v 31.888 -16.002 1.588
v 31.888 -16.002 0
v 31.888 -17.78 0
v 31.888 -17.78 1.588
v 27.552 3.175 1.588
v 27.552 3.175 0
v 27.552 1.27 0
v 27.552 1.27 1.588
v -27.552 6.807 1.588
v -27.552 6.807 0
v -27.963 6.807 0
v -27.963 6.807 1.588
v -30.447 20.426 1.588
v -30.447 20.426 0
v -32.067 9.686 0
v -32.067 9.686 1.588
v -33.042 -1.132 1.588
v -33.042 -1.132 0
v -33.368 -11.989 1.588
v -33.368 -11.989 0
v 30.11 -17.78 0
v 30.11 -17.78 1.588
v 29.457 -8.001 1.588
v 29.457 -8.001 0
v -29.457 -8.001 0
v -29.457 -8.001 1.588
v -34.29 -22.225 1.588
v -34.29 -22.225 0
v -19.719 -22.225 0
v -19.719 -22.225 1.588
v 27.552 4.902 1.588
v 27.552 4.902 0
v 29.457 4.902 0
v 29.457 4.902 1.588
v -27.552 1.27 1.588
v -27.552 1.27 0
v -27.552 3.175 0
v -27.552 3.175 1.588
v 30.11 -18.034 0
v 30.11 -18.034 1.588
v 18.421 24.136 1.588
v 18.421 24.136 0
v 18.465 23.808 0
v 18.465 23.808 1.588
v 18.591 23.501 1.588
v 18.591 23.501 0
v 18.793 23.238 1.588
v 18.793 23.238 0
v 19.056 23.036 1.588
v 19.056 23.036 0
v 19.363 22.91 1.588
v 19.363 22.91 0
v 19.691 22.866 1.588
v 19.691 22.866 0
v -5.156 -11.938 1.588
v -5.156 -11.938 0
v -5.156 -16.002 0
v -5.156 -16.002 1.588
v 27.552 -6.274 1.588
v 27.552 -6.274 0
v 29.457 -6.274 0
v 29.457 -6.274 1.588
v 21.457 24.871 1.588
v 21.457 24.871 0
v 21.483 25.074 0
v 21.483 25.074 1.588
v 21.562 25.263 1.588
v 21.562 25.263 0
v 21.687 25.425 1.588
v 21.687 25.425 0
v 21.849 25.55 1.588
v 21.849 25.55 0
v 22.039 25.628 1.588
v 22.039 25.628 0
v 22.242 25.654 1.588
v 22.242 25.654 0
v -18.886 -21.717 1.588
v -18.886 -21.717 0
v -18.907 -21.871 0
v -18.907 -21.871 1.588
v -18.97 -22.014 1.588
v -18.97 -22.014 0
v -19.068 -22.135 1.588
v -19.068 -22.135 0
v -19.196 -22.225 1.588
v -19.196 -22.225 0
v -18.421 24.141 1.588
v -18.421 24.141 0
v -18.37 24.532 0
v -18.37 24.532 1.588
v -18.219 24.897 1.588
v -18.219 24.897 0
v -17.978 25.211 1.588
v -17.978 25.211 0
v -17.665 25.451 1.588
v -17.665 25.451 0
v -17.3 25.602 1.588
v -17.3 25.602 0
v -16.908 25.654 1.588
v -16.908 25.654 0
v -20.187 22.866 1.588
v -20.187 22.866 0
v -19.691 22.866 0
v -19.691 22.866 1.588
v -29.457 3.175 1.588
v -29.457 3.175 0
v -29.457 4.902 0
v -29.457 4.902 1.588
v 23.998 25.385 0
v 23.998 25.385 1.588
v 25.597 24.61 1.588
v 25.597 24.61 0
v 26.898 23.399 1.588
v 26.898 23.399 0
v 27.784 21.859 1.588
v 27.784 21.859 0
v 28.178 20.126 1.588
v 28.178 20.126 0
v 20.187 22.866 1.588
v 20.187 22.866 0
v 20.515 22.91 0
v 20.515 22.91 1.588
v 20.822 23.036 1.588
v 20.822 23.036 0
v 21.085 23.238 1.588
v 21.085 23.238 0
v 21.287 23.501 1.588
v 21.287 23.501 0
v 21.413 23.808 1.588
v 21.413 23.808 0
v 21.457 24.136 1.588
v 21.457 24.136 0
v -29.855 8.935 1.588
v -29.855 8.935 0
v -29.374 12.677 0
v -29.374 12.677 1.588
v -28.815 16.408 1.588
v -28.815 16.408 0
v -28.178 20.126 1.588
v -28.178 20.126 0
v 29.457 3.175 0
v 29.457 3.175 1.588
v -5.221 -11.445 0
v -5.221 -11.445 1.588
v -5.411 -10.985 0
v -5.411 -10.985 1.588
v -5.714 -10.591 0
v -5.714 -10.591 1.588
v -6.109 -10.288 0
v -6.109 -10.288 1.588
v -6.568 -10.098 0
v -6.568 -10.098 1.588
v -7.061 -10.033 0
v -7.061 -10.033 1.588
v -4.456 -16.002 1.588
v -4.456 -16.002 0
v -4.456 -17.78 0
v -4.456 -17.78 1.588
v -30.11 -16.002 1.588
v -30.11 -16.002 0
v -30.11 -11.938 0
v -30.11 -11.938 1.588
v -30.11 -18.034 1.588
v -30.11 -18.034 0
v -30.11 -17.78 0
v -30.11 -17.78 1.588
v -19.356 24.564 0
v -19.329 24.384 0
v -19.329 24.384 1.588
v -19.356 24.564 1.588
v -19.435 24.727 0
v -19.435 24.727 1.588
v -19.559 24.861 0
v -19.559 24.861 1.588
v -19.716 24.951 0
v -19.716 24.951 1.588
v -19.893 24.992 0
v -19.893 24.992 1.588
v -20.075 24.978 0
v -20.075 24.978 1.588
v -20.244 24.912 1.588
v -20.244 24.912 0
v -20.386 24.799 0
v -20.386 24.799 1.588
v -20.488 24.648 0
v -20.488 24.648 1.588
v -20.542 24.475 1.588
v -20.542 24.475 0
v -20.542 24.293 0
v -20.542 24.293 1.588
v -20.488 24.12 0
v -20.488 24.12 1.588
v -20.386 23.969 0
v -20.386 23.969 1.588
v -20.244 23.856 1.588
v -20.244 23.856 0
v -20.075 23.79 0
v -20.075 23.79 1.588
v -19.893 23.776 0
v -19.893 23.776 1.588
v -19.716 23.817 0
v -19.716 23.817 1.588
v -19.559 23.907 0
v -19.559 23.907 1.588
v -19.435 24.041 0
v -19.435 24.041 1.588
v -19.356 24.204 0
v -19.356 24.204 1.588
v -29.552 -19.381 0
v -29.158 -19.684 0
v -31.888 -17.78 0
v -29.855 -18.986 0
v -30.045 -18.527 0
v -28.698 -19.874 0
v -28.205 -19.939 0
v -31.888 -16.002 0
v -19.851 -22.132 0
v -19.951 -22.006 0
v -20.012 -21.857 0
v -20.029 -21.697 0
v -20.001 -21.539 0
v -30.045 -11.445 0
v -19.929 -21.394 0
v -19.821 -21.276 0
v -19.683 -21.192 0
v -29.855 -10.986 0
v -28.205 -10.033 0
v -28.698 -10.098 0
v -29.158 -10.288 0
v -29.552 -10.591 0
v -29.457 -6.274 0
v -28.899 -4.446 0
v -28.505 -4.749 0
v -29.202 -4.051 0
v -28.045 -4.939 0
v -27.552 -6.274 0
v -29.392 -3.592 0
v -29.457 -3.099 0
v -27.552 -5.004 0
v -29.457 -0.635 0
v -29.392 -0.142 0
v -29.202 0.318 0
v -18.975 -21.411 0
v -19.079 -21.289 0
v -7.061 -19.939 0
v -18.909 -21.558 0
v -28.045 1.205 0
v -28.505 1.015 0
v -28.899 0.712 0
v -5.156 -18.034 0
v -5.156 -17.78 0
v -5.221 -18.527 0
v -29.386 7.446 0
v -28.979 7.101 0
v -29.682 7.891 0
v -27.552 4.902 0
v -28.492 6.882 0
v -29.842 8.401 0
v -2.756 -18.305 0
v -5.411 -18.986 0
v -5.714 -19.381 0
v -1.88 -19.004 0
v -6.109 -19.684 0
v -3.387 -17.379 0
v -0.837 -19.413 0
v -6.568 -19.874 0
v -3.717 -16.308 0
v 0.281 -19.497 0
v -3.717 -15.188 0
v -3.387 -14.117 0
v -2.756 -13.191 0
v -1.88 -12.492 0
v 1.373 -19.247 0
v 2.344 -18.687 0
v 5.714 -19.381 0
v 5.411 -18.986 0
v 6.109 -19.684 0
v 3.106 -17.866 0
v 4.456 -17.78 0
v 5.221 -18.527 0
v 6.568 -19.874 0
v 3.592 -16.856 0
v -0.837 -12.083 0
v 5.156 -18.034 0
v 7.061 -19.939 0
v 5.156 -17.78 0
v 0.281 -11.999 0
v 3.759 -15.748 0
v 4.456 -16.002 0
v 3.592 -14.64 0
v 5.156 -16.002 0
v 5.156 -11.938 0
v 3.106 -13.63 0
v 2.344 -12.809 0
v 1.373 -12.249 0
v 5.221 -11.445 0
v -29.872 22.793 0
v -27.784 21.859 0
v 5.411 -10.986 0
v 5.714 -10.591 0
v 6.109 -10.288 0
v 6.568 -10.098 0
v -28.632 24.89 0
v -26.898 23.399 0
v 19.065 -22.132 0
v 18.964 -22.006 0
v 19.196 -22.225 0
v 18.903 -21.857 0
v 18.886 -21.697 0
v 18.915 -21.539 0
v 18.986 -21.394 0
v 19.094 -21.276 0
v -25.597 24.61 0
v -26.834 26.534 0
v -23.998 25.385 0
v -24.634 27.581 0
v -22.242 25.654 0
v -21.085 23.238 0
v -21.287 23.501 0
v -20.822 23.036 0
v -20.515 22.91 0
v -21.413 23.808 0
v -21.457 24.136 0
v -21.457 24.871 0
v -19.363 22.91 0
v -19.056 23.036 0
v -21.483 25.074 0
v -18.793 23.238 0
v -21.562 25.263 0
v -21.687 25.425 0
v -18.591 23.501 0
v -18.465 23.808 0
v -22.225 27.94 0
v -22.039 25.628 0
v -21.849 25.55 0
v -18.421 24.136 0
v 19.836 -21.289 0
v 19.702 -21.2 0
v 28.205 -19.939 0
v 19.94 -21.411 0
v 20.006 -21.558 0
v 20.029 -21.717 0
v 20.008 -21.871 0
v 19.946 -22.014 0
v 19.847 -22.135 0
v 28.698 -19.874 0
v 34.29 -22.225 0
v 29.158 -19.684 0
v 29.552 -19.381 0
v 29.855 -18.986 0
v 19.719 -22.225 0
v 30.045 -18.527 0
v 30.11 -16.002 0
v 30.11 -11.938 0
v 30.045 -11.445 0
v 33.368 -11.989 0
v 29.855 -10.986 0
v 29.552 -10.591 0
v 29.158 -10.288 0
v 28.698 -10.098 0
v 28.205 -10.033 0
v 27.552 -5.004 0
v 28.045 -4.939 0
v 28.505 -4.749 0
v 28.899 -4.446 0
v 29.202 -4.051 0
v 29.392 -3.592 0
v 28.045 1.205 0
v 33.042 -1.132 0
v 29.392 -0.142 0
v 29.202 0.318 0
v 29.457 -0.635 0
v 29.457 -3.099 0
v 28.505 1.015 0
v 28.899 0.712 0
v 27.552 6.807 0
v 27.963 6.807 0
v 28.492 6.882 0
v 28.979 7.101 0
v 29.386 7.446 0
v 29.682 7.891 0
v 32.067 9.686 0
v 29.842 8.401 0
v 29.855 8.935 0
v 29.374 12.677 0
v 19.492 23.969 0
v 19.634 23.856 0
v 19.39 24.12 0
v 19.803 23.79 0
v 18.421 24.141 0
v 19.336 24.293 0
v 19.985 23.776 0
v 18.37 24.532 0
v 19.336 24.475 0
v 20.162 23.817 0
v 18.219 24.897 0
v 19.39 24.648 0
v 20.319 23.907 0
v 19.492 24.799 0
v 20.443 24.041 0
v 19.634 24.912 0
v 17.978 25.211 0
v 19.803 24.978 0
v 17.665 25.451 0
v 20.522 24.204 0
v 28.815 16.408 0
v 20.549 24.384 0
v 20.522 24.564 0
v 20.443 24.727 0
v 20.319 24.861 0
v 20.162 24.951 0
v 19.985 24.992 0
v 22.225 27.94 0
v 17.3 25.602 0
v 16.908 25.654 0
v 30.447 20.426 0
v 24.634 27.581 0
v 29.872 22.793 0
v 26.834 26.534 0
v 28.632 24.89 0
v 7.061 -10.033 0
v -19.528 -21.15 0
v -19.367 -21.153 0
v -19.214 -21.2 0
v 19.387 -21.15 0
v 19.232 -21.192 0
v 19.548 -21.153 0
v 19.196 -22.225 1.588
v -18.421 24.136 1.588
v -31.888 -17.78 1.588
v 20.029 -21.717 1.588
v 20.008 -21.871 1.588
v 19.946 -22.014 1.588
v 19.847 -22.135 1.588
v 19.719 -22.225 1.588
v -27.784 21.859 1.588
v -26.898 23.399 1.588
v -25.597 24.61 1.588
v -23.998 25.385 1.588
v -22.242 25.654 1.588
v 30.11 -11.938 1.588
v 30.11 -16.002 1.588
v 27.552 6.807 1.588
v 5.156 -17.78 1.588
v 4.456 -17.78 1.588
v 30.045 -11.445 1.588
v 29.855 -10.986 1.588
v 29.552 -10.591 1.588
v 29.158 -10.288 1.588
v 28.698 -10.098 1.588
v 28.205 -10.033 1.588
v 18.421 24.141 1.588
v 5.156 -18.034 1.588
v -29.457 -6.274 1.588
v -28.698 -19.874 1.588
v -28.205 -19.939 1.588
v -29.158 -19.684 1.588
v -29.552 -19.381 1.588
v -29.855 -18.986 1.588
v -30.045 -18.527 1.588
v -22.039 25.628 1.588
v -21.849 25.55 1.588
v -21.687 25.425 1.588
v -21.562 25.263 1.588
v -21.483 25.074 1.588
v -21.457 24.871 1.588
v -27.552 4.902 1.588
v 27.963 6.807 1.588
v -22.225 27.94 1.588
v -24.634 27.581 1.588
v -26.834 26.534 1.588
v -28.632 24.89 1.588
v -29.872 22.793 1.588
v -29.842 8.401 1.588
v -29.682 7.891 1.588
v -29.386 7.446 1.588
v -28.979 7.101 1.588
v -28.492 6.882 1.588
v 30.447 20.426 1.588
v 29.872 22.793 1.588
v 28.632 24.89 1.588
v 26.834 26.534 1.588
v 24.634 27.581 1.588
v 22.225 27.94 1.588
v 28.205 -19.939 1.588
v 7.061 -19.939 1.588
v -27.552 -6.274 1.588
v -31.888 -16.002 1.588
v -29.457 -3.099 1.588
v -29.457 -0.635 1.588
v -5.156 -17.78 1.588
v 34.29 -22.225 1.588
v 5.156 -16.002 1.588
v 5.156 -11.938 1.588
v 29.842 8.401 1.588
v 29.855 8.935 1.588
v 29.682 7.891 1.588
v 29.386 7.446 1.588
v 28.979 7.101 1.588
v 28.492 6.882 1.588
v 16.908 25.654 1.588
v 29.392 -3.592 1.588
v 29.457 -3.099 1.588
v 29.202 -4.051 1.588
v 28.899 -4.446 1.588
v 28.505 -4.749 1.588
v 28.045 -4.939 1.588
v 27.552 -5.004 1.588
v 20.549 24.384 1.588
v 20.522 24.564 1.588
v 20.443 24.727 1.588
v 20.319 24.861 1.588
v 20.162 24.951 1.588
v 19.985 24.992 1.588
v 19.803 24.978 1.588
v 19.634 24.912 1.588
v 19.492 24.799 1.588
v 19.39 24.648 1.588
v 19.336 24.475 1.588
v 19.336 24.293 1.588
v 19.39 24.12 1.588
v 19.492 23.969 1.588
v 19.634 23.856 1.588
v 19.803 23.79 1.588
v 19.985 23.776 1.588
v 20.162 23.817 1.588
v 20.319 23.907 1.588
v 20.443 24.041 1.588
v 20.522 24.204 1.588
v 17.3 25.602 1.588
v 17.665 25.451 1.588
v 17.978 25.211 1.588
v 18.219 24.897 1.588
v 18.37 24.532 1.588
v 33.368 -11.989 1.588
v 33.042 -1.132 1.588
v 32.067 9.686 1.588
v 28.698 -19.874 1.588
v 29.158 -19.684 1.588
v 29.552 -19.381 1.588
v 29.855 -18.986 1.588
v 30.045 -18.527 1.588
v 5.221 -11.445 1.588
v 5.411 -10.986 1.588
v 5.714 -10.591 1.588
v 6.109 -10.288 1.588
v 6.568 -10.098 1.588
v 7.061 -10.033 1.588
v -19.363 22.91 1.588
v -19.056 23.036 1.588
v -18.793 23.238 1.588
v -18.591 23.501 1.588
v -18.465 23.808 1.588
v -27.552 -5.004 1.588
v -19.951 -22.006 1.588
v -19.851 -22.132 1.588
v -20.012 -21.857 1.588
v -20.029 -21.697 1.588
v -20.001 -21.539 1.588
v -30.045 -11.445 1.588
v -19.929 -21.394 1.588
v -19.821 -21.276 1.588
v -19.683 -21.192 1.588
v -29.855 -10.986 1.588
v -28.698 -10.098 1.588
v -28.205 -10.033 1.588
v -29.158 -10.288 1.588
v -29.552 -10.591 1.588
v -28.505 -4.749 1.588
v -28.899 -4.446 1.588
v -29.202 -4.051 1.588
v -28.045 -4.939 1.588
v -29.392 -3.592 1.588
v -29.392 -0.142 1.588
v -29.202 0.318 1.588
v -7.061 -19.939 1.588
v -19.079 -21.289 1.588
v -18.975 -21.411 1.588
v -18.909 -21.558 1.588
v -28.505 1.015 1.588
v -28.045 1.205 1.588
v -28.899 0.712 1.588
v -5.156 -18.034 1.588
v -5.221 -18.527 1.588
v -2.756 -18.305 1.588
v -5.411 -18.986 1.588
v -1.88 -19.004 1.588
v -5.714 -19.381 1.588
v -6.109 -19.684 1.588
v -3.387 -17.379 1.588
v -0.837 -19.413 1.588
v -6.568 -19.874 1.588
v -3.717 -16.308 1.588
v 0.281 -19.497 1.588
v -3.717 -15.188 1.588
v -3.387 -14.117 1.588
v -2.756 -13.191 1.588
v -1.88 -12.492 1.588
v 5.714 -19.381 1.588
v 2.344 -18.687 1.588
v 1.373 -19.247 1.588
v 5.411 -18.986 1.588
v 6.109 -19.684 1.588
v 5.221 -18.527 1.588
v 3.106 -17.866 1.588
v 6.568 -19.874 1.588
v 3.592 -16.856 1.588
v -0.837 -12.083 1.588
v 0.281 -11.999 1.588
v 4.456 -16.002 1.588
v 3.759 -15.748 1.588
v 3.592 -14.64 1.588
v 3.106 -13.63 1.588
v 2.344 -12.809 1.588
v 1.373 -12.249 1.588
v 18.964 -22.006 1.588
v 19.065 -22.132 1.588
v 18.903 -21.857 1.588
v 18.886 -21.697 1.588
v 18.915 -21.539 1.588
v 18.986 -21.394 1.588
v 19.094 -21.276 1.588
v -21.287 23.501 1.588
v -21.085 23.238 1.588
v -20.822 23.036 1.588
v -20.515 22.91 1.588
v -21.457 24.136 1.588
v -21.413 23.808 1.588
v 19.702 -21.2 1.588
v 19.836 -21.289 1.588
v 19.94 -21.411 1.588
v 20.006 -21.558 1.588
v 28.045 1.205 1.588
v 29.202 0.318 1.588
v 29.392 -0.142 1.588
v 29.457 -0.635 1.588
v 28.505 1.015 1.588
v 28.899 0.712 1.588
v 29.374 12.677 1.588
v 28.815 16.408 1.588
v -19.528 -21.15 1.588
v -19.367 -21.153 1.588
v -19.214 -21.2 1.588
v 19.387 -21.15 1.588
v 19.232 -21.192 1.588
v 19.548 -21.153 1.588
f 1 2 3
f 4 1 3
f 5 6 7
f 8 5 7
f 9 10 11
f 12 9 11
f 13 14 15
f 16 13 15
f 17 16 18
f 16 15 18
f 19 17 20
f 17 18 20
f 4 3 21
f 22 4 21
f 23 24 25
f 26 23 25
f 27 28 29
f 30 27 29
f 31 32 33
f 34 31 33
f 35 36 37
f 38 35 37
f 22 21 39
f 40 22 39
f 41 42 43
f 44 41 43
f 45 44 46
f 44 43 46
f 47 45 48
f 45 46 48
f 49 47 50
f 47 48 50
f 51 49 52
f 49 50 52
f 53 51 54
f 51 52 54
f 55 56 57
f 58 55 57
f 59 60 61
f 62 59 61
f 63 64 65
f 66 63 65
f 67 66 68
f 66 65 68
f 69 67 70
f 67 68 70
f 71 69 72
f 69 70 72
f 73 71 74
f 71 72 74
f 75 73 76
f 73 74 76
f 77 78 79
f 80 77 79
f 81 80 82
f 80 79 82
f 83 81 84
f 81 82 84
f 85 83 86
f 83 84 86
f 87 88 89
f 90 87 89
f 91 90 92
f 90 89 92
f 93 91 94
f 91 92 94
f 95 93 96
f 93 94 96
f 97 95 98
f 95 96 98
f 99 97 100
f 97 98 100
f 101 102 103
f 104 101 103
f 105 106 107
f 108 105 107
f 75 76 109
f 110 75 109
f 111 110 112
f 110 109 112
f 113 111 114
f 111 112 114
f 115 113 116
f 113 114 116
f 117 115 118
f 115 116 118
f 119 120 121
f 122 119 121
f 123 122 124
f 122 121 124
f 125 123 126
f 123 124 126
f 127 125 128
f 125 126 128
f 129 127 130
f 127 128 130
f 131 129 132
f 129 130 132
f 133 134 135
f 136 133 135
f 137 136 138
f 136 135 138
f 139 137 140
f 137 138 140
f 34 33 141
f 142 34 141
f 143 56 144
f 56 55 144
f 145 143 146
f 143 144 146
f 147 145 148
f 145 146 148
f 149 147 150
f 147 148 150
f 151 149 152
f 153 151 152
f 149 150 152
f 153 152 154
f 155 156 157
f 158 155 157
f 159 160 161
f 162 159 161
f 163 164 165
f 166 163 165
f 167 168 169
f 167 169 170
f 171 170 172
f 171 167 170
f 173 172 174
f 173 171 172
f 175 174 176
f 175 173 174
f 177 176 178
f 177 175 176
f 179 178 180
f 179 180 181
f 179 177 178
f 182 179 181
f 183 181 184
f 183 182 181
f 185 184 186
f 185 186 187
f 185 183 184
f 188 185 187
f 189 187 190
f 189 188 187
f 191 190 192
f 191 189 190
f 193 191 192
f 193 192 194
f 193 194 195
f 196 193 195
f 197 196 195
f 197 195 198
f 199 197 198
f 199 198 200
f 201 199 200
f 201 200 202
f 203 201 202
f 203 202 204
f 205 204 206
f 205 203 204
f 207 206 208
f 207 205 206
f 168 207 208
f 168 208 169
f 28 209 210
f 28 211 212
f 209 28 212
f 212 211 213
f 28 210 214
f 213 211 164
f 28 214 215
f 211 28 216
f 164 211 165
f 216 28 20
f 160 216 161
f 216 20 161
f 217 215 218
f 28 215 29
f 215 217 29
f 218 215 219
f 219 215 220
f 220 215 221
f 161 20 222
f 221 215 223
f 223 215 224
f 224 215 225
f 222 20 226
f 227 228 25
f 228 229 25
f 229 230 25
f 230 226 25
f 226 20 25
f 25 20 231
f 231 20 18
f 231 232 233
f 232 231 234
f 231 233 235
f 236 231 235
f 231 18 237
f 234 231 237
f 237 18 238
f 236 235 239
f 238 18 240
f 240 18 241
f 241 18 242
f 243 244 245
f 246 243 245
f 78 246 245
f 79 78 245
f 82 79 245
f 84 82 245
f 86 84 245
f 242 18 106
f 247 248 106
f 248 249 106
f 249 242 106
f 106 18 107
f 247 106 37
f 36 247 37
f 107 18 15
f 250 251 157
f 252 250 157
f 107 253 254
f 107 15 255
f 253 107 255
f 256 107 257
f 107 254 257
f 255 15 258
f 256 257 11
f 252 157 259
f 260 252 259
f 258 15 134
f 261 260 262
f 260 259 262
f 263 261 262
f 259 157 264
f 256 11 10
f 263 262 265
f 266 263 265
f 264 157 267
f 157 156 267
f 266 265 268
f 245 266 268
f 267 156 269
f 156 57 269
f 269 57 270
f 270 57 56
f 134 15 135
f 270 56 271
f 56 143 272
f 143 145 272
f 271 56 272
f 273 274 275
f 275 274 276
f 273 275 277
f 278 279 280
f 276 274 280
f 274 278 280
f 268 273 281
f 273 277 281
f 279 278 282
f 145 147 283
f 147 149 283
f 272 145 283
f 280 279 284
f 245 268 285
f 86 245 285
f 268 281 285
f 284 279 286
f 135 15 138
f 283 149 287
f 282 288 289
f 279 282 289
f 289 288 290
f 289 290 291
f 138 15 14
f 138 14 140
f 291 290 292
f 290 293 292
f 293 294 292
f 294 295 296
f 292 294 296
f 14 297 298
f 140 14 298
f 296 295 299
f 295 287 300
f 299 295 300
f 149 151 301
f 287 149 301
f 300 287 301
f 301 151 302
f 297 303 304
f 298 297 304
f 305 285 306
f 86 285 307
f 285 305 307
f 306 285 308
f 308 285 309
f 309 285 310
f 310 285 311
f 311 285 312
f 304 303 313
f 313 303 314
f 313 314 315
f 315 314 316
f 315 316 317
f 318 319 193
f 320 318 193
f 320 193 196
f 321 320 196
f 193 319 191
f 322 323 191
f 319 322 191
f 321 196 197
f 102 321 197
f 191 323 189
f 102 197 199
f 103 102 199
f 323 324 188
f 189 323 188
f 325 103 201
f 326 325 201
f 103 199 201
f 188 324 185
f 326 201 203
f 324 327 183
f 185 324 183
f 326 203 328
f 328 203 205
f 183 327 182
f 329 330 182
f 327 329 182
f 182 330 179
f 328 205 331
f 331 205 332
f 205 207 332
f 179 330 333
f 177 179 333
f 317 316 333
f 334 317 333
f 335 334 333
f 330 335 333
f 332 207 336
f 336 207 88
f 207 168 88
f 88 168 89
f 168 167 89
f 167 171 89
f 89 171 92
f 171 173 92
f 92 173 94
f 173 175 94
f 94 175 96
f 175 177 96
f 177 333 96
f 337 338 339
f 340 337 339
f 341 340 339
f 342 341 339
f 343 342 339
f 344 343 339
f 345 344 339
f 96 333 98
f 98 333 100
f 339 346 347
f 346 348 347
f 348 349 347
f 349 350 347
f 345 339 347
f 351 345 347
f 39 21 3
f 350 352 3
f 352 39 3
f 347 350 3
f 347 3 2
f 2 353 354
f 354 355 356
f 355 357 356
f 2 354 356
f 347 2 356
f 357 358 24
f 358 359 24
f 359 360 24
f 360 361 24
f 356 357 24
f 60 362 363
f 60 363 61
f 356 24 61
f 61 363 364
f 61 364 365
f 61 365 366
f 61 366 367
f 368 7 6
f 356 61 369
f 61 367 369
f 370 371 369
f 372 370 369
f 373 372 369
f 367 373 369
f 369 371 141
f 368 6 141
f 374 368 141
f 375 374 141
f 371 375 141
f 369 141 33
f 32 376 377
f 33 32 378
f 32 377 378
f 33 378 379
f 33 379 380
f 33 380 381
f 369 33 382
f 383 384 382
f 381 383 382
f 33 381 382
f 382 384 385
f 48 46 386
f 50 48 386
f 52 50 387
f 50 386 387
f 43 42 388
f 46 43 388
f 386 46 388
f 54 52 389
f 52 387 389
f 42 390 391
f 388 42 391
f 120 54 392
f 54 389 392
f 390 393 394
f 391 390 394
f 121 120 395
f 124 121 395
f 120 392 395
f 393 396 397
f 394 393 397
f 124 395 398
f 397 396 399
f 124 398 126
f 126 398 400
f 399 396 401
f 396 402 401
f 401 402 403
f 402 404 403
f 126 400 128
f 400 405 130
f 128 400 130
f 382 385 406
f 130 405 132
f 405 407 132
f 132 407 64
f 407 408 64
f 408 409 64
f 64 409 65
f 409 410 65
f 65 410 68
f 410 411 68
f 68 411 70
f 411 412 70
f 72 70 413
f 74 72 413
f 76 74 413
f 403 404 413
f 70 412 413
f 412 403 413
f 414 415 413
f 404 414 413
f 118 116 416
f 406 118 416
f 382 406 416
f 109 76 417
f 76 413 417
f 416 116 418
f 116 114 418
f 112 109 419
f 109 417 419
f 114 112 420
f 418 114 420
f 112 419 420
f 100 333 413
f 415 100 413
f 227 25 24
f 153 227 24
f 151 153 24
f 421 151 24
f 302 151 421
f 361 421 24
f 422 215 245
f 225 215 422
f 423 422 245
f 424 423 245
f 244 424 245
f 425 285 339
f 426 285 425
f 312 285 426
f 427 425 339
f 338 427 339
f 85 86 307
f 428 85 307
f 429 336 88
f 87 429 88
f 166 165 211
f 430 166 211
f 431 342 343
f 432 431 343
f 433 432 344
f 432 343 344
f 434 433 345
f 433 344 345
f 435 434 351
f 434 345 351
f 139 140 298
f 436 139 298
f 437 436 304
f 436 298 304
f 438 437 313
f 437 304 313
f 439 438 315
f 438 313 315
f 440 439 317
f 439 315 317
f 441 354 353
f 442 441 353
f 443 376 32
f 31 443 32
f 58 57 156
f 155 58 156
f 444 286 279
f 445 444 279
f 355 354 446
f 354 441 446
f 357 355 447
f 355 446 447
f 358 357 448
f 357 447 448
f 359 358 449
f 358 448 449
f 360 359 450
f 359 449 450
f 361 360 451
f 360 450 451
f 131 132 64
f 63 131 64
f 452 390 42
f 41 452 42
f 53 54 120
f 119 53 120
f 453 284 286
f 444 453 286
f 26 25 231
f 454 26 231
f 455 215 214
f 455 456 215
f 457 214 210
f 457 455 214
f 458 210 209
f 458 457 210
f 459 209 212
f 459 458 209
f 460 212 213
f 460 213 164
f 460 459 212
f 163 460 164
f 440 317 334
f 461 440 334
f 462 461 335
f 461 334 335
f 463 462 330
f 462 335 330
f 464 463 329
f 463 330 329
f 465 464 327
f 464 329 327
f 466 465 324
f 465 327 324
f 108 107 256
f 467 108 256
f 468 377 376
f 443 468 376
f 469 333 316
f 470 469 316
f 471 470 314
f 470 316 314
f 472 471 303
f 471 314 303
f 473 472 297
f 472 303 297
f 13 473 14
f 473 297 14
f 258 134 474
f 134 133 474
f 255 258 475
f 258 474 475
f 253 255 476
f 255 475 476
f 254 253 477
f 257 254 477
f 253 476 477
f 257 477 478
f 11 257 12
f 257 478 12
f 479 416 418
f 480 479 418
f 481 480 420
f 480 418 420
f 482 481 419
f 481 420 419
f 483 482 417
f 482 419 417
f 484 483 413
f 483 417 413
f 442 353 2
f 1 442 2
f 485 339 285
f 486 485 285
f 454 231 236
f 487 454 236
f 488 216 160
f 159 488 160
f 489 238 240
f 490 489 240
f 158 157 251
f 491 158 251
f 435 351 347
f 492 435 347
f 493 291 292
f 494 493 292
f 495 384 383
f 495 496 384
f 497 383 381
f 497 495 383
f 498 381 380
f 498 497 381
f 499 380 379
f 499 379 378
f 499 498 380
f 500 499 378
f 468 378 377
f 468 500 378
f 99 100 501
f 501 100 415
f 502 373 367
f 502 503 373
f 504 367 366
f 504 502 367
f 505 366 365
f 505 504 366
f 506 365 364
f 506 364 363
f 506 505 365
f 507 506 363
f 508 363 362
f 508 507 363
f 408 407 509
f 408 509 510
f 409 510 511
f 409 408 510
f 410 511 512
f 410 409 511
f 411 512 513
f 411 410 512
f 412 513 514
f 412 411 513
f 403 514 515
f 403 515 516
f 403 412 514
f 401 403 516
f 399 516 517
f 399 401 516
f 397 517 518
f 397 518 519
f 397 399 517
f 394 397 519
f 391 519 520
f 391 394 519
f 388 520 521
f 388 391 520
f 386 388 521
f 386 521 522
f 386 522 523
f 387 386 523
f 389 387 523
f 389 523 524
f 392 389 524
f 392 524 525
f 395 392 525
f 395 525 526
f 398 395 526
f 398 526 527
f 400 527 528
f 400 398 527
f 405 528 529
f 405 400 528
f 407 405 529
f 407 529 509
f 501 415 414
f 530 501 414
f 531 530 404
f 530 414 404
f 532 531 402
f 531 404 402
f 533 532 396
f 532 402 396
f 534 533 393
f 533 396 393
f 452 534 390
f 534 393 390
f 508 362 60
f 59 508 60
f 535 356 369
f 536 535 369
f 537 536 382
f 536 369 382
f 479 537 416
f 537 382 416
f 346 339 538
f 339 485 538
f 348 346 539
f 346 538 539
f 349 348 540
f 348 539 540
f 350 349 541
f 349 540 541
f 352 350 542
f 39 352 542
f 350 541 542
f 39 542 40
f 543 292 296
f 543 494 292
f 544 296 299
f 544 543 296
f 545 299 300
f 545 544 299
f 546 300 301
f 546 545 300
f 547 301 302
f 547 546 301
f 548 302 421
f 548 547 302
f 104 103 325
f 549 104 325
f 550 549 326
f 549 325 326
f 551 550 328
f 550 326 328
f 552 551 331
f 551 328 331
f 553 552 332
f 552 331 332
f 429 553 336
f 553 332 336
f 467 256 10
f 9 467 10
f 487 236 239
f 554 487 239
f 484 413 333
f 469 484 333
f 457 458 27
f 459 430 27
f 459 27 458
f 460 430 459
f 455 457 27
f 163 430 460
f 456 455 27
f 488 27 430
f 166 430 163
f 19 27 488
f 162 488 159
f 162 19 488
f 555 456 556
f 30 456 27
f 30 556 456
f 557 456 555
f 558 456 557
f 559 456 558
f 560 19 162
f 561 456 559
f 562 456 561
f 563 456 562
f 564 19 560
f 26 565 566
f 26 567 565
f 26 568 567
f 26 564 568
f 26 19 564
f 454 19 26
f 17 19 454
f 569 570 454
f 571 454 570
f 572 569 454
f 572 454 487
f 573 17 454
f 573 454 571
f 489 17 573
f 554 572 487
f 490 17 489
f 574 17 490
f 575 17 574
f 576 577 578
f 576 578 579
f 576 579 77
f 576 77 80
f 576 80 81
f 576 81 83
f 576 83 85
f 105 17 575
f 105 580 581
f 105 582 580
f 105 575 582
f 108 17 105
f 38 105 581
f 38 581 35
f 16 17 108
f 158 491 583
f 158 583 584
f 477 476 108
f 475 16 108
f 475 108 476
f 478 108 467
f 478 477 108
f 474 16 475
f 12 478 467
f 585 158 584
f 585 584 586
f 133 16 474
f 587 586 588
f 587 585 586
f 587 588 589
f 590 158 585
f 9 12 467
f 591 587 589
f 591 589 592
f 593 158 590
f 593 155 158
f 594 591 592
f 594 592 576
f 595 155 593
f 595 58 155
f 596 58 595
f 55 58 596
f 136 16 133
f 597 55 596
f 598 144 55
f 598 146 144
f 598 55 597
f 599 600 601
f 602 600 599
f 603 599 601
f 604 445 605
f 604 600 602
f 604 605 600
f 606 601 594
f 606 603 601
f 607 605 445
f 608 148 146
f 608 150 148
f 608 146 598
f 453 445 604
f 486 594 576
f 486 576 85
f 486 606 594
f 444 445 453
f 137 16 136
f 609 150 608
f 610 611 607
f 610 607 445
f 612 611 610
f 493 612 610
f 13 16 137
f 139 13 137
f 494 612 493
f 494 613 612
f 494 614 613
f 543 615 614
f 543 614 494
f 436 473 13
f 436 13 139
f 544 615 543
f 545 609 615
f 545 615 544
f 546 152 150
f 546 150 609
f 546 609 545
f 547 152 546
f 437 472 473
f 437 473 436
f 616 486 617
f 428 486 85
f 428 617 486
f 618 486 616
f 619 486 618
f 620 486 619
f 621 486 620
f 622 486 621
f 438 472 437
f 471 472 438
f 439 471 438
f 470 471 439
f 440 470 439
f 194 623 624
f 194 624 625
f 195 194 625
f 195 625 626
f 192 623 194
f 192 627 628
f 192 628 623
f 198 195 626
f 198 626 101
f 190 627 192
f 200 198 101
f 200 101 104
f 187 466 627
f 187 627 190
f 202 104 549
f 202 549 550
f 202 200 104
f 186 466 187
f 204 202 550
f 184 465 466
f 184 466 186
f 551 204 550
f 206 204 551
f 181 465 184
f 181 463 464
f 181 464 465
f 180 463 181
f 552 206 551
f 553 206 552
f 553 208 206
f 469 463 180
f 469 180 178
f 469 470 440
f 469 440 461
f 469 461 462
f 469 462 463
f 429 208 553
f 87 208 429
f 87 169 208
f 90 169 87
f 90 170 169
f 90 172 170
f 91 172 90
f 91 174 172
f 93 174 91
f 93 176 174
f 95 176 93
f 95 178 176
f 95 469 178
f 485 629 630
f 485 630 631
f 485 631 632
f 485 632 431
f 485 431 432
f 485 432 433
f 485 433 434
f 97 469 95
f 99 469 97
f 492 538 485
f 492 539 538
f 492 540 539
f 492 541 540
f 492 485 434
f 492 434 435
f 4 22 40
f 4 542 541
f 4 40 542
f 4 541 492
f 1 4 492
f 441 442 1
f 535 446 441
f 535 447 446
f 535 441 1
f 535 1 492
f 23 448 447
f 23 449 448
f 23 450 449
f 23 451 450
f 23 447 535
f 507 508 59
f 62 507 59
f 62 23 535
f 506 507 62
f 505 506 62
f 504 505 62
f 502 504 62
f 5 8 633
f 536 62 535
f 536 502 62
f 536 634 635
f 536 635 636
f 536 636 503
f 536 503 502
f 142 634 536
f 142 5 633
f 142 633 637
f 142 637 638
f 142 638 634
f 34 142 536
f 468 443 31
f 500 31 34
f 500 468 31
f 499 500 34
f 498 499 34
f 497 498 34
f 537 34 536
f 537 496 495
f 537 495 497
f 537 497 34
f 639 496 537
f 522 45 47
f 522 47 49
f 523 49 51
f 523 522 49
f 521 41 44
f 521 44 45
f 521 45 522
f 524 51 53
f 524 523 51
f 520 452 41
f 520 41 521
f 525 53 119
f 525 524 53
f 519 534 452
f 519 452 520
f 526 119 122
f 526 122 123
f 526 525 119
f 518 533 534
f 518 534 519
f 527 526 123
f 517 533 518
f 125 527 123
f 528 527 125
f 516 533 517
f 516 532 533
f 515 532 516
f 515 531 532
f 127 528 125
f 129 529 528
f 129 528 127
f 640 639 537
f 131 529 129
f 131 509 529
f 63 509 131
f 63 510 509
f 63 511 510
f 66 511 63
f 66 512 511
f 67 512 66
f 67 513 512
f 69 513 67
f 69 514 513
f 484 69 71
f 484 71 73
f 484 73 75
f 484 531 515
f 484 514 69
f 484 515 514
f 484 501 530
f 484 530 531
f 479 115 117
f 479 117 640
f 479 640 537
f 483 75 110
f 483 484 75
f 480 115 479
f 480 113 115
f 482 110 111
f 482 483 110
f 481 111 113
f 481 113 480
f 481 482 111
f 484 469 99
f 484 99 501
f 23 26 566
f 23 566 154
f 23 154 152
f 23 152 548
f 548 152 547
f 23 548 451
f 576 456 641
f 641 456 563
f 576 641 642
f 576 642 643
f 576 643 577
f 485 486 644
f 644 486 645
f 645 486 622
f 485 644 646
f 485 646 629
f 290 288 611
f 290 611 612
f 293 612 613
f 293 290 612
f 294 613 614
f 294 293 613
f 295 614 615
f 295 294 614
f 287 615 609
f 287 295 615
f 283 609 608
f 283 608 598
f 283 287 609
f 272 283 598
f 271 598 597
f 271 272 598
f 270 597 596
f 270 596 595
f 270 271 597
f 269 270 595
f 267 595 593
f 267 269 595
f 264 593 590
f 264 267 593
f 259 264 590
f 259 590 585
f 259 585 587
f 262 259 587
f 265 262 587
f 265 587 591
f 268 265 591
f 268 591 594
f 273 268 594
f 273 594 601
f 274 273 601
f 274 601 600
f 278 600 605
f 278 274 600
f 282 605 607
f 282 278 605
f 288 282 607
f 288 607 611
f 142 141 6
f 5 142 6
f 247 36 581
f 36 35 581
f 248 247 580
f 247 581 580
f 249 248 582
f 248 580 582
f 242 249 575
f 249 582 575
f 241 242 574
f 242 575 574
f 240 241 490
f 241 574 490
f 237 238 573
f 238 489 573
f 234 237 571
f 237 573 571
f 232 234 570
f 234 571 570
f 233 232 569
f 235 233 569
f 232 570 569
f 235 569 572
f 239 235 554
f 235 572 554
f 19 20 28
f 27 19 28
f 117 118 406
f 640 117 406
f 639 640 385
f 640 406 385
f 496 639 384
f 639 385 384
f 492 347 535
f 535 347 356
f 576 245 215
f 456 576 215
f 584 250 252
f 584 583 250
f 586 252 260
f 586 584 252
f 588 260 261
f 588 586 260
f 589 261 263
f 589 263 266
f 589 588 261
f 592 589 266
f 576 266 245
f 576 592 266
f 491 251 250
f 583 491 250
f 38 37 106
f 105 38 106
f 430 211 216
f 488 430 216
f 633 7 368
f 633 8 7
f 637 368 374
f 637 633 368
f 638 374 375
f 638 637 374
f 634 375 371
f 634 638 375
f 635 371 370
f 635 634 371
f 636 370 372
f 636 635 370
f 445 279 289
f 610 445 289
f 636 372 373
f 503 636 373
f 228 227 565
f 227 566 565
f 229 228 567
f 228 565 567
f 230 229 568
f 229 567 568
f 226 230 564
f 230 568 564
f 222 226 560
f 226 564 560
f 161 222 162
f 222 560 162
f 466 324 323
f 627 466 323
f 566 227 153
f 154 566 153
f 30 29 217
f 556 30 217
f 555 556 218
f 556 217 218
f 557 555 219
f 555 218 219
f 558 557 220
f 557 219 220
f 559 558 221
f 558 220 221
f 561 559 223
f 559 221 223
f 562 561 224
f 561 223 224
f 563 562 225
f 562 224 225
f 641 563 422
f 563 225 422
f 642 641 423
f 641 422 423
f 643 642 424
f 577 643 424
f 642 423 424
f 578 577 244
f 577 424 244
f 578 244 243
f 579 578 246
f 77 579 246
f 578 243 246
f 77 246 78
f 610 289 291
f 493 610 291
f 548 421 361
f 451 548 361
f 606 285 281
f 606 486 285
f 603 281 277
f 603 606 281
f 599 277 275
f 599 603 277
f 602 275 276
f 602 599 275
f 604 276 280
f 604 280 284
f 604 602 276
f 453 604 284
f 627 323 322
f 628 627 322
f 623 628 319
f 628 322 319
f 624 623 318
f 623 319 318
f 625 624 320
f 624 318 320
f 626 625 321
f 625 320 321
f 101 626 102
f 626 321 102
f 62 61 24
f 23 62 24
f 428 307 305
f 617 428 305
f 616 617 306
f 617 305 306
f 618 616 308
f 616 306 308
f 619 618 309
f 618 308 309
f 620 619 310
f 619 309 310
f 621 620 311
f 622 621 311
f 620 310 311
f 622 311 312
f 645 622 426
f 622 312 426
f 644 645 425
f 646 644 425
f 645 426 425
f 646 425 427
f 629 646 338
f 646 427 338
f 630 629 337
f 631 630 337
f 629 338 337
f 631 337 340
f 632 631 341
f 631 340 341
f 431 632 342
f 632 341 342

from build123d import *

# Parameters (mm, degrees)
SKETCH1_R           = 3.7592
SKETCH1_R_2         = 0.6096
BOSS_EXTRUDE1_DEPTH = 1.5875
FILLET1_R           = 1.905
FILLET2_R           = 1.905


with BuildPart() as part:
    # Sketch1 → Boss-Extrude1 (new body)
    with BuildSketch(Plane.XY):
        with BuildLine():
            Line((34.29, -22.225), (33.367605666, -11.9888))
            ThreePointArc((33.367605666, -11.9888), (32.635899737, 4.284200971), (30.44668746, 20.425864572))
            ThreePointArc((30.44668746, 20.425864572), (27.794074787, 25.778474462), (22.225, 27.94))
            Line((22.225, 27.94), (-22.225, 27.94))
            ThreePointArc((-22.225, 27.94), (-27.794074787, 25.778474462), (-30.44668746, 20.425864572))
            ThreePointArc((-30.44668746, 20.425864572), (-32.635899737, 4.284200971), (-33.367605666, -11.9888))
            Line((-33.367605666, -11.9888), (-34.29, -22.225))
            Line((-34.29, -22.225), (-19.719346062, -22.225))
            ThreePointArc((-19.719346062, -22.225), (-19.755004666, -21.229024189), (-18.886028855, -21.717))
            ThreePointArc((-18.886028855, -21.717), (-18.969553044, -22.014475811), (-19.195711648, -22.225))
            Line((-19.195711648, -22.225), (19.195711648, -22.225))
            ThreePointArc((19.195711648, -22.225), (19.160053044, -21.229024189), (20.029028855, -21.717))
            ThreePointArc((20.029028855, -21.717), (19.945504666, -22.014475811), (19.719346062, -22.225))
            Line((19.719346062, -22.225), (34.29, -22.225))
        make_face()
        Polygon((-5.1562, -19.939), (-30.110080889, -19.939), (-30.110080889, -17.78), (-31.888080889, -17.78), (-31.888080889, -16.002), (-30.110080889, -16.002), (-30.110080889, -10.033), (-5.1562, -10.033), (-5.1562, -16.002), (-4.456080889, -16.002), (-4.456080889, -17.78), (-5.1562, -17.78), align=None, mode=Mode.SUBTRACT)
        with Locations((0, -15.748)):
            Circle(SKETCH1_R, mode=Mode.SUBTRACT)
        Polygon((5.1562, -19.939), (5.1562, -17.78), (4.456080889, -17.78), (4.456080889, -16.002), (5.1562, -16.002), (5.1562, -10.033), (30.110080889, -10.033), (30.110080889, -16.002), (31.888080889, -16.002), (31.888080889, -17.78), (30.110080889, -17.78), (30.110080889, -19.939), align=None, mode=Mode.SUBTRACT)
        with BuildLine():
            Line((-16.907947674, 25.654), (16.907947674, 25.654))
            ThreePointArc((16.907947674, 25.654), (17.978031977, 25.210756569), (18.421275408, 24.140672267))
            Line((18.421275408, 24.140672267), (18.421275408, 24.136275408))
            ThreePointArc((18.421275408, 24.136275408), (18.793249795, 23.238249795), (19.691275408, 22.866275408))
            Line((19.691275408, 22.866275408), (20.186724592, 22.866275408))
            ThreePointArc((20.186724592, 22.866275408), (21.084750205, 23.238249795), (21.456724592, 24.136275408))
            Line((21.456724592, 24.136275408), (21.456724592, 24.871259676))
            ThreePointArc((21.456724592, 24.871259676), (21.686749328, 25.425496663), (22.24162483, 25.653976848))
            ThreePointArc((22.24162483, 25.653976848), (26.292824304, 24.053268127), (28.177671702, 20.126203591))
            ThreePointArc((28.177671702, 20.126203591), (29.260117929, 13.484694907), (30.092217203, 6.8072))
            Line((30.092217203, 6.8072), (27.552217203, 6.8072))
            Line((27.552217203, 6.8072), (27.552217203, 4.9022))
            Line((27.552217203, 4.9022), (29.457217203, 4.9022))
            Line((29.457217203, 4.9022), (29.457217203, 3.175))
            Line((29.457217203, 3.175), (27.552217203, 3.175))
            Line((27.552217203, 3.175), (27.552217203, 1.27))
            Line((27.552217203, 1.27), (29.457217203, 1.27))
            Line((29.457217203, 1.27), (29.457217203, -5.0038))
            Line((29.457217203, -5.0038), (27.552217203, -5.0038))
            Line((27.552217203, -5.0038), (27.552217203, -6.2738))
            Line((27.552217203, -6.2738), (29.457217203, -6.2738))
            Line((29.457217203, -6.2738), (29.457217203, -8.001))
            Line((29.457217203, -8.001), (-29.457217203, -8.001))
            Line((-29.457217203, -8.001), (-29.457217203, -6.2738))
            Line((-29.457217203, -6.2738), (-27.552217203, -6.2738))
            Line((-27.552217203, -6.2738), (-27.552217203, -5.0038))
            Line((-27.552217203, -5.0038), (-29.457217203, -5.0038))
            Line((-29.457217203, -5.0038), (-29.457217203, 1.27))
            Line((-29.457217203, 1.27), (-27.552217203, 1.27))
            Line((-27.552217203, 1.27), (-27.552217203, 3.175))
            Line((-27.552217203, 3.175), (-29.457217203, 3.175))
            Line((-29.457217203, 3.175), (-29.457217203, 4.9022))
            Line((-29.457217203, 4.9022), (-27.552217203, 4.9022))
            Line((-27.552217203, 4.9022), (-27.552217203, 6.8072))
            Line((-27.552217203, 6.8072), (-30.092217203, 6.8072))
            ThreePointArc((-30.092217203, 6.8072), (-29.260117929, 13.484694907), (-28.177671702, 20.126203591))
            ThreePointArc((-28.177671702, 20.126203591), (-26.292824304, 24.053268127), (-22.24162483, 25.653976848))
            ThreePointArc((-22.24162483, 25.653976848), (-21.686749328, 25.425496663), (-21.456724592, 24.871259676))
            Line((-21.456724592, 24.871259676), (-21.456724592, 24.136275408))
            ThreePointArc((-21.456724592, 24.136275408), (-21.084750205, 23.238249795), (-20.186724592, 22.866275408))
            Line((-20.186724592, 22.866275408), (-19.691275408, 22.866275408))
            ThreePointArc((-19.691275408, 22.866275408), (-18.793249795, 23.238249795), (-18.421275408, 24.136275408))
            Line((-18.421275408, 24.136275408), (-18.421275408, 24.140672267))
            ThreePointArc((-18.421275408, 24.140672267), (-17.978031977, 25.210756569), (-16.907947674, 25.654))
        make_face(mode=Mode.SUBTRACT)
        with Locations((-19.939, 24.384)):
            Circle(SKETCH1_R_2, mode=Mode.SUBTRACT)
        with Locations((19.939, 24.384)):
            Circle(SKETCH1_R_2, mode=Mode.SUBTRACT)
    extrude(amount=BOSS_EXTRUDE1_DEPTH)

    # Fillet1
    fillet1_edges = [part.edges().sort_by_distance(p)[0] for p in [
        (5.1562, -19.939, 0.79375),
        (30.110080889, -19.939, 0.79375),
        (30.110080889, -10.033, 0.79375),
        (5.1562, -10.033, 0.79375),
        (-5.1562, -19.939, 0.79375),
        (-5.1562, -10.033, 0.79375),
        (-30.110080889, -10.033, 0.79375),
        (-30.110080889, -19.939, 0.79375),
    ]]
    fillet(fillet1_edges, radius=FILLET1_R)

    # Fillet2
    fillet2_edges = [part.edges().sort_by_distance(p)[0] for p in [
        (-29.457217203, 1.27, 0.79375),
        (-29.457217203, -5.0038, 0.79375),
        (-30.092217203, 6.8072, 0.79375),
        (29.457217203, -5.0038, 0.79375),
        (29.457217203, 1.27, 0.79375),
        (30.092217203, 6.8072, 0.79375),
    ]]
    fillet(fillet2_edges, radius=FILLET2_R - 0.0001)  # a hair under: the kernel refuses the full size


solid = part.part
